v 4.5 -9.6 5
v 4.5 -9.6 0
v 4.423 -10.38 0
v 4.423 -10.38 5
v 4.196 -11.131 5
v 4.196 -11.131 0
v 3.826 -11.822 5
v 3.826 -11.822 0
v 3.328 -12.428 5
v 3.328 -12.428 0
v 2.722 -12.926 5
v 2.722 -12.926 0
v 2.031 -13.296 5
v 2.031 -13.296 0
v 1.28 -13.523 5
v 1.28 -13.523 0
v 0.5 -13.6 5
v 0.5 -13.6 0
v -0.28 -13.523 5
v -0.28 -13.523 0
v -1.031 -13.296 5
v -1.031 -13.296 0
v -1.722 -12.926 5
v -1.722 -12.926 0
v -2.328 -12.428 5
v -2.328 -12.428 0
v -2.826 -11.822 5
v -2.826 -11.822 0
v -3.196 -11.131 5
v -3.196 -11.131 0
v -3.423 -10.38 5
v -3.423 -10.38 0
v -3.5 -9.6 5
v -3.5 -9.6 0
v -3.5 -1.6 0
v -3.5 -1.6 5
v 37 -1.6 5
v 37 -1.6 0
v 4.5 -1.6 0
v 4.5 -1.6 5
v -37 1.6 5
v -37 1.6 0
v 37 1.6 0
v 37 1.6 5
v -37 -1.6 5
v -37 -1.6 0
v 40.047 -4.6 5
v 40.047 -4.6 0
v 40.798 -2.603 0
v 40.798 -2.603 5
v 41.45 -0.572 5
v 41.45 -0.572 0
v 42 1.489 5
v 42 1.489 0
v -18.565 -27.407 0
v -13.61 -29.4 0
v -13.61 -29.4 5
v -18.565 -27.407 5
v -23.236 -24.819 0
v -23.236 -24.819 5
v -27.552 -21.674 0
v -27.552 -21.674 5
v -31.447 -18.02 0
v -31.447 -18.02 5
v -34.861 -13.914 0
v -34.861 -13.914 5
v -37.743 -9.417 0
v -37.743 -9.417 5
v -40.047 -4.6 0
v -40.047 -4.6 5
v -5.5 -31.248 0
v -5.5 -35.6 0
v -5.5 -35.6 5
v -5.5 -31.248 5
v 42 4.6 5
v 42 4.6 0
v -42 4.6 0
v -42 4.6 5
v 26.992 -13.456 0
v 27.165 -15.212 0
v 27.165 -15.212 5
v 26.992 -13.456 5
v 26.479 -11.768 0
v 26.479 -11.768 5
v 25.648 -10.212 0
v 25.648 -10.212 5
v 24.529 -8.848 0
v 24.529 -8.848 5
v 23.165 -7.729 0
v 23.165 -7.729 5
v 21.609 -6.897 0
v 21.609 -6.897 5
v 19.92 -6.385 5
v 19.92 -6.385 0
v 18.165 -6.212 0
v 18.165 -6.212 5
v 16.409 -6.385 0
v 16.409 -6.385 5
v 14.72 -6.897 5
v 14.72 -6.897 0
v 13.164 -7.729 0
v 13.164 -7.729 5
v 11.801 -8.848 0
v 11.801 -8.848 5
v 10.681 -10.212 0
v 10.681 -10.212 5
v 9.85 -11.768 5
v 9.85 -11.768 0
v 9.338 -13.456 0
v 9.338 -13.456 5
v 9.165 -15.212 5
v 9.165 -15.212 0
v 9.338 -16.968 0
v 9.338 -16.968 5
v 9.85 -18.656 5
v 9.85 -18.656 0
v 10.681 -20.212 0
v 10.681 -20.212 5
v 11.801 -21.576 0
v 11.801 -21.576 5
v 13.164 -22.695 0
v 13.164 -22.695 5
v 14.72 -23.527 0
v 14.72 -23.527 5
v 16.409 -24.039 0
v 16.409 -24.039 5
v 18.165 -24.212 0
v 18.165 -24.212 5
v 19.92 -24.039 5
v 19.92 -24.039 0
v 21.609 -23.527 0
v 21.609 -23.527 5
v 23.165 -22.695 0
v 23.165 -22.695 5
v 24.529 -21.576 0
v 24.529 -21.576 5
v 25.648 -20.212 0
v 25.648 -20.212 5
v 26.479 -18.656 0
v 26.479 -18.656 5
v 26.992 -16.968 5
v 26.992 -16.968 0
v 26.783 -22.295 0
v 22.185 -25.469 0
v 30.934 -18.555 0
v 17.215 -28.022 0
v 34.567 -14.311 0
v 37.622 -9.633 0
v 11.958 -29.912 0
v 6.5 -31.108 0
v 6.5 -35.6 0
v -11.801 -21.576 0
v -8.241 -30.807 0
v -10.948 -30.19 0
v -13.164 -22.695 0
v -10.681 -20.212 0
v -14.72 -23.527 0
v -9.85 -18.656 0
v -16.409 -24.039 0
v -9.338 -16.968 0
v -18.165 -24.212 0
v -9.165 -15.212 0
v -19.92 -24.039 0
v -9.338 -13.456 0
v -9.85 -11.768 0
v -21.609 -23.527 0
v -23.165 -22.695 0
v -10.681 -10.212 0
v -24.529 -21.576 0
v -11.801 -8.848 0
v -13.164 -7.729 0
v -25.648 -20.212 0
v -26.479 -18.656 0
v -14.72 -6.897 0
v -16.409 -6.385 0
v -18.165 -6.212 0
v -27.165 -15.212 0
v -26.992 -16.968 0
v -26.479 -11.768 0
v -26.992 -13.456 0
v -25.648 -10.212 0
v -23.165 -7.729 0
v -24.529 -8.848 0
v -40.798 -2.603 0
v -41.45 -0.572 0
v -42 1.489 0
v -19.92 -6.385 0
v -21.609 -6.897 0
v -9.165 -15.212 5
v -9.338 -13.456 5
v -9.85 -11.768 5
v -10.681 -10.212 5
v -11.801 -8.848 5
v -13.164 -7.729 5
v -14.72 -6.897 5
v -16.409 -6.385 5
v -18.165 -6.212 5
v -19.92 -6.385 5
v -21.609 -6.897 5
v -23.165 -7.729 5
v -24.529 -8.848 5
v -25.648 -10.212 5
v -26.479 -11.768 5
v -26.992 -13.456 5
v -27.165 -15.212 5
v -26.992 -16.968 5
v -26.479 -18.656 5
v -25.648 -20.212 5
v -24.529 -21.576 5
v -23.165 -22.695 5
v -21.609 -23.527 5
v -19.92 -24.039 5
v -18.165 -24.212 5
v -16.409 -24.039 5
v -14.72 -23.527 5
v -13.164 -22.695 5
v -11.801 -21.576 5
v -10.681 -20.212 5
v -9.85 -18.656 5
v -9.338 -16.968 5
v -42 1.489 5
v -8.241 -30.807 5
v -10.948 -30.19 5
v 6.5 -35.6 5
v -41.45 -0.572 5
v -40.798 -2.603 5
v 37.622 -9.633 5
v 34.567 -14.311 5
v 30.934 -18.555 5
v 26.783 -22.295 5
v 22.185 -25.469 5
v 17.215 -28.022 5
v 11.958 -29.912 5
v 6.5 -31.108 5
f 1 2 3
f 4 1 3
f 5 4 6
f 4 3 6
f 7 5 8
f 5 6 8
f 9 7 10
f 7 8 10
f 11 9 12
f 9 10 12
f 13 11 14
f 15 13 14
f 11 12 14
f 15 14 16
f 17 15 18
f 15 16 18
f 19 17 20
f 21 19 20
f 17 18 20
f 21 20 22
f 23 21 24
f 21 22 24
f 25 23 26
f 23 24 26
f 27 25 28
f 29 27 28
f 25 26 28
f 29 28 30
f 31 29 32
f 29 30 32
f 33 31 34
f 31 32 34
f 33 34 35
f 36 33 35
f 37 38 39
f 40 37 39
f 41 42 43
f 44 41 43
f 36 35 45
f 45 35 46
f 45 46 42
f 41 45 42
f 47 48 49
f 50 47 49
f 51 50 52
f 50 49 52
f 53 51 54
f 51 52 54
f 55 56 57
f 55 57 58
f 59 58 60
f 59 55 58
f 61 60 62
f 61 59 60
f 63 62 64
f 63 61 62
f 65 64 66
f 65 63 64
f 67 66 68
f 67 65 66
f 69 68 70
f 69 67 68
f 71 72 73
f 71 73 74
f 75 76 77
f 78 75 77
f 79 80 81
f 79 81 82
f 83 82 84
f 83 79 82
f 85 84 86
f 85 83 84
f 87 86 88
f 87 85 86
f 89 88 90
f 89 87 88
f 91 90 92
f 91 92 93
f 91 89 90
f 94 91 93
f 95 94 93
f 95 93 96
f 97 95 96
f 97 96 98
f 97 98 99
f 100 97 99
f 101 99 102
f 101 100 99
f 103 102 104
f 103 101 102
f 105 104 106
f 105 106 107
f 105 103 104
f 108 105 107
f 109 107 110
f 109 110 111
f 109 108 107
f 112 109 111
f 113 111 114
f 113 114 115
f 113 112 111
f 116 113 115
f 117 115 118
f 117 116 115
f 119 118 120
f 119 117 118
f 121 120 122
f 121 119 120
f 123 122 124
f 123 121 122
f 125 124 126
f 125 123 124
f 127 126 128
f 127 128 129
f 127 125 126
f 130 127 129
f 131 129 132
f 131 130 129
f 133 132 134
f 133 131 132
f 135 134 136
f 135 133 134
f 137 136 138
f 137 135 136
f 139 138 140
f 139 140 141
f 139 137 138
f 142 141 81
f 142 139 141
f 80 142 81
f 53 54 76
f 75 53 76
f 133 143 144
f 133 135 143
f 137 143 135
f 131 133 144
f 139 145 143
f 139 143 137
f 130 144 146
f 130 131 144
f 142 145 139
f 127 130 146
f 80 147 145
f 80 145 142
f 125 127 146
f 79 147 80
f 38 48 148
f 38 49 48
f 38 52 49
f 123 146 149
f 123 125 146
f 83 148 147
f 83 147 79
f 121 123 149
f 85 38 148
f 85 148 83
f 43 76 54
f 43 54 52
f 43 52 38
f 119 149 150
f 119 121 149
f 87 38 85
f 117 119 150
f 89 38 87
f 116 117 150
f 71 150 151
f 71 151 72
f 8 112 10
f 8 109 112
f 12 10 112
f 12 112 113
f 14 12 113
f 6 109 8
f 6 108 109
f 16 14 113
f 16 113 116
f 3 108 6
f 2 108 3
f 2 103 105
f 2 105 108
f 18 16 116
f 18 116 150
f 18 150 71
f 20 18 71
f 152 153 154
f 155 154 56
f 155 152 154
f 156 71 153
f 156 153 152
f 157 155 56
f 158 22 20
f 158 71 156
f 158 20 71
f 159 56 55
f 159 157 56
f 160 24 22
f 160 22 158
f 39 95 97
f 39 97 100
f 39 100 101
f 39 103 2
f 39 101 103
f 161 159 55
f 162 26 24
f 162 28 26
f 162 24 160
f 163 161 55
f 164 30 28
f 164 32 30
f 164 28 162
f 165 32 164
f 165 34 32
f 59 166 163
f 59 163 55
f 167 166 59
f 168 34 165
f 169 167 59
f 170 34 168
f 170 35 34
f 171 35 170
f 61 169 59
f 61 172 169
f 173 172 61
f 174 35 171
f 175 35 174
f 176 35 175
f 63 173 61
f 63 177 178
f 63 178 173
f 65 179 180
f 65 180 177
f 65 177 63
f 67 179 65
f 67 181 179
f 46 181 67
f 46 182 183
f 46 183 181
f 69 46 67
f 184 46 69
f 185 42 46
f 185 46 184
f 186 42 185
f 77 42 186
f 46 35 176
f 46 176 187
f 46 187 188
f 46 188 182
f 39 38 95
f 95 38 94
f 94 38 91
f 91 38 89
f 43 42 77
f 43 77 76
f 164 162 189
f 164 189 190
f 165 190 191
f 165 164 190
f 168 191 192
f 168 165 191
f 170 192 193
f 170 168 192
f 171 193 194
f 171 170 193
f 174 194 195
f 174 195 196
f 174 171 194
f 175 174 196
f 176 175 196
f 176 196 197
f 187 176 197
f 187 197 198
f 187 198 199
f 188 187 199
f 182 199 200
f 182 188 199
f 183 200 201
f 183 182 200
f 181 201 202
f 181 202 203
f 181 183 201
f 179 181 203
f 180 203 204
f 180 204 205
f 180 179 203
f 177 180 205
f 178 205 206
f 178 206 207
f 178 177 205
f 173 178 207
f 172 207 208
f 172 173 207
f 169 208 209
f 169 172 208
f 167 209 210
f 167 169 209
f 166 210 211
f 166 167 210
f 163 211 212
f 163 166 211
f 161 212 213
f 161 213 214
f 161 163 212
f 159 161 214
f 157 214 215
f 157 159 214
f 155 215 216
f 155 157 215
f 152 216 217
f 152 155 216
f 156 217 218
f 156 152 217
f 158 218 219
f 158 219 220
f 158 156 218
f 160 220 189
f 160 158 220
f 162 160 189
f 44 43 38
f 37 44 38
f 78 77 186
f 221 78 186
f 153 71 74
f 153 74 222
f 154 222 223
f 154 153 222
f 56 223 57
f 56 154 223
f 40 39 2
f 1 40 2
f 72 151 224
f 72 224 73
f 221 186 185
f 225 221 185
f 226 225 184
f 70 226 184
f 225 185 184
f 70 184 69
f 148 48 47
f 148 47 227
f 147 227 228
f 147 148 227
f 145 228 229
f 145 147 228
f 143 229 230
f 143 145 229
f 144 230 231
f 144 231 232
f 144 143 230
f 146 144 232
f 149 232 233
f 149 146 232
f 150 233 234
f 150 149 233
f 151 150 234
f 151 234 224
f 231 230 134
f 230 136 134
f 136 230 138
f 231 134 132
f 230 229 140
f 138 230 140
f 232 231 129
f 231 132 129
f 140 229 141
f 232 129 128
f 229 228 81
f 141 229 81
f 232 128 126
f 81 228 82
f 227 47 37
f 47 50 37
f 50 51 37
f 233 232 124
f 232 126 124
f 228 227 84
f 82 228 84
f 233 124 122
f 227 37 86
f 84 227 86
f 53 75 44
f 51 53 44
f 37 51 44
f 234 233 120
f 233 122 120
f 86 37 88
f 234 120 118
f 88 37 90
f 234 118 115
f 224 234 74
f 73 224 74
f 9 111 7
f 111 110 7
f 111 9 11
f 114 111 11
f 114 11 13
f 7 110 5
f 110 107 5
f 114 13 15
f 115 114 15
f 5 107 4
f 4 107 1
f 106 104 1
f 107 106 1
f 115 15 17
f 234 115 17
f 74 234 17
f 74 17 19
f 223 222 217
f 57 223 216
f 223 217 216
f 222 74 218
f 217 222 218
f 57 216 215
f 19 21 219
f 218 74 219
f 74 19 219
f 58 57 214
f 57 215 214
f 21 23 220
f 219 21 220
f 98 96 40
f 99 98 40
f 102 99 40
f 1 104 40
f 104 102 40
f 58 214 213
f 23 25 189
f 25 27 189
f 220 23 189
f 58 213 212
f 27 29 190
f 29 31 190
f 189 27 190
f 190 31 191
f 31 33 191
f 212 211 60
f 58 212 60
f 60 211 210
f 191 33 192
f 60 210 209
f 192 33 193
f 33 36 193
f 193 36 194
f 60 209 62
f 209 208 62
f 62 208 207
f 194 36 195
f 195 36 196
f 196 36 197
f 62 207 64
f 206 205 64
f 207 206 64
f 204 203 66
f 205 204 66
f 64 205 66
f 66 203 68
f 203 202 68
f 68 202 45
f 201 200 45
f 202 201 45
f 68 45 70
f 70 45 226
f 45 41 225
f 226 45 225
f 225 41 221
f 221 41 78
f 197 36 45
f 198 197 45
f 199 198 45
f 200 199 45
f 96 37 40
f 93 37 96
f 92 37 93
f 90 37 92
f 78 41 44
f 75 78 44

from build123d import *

# Parameters (mm, degrees)
SALIENTE_EXTRUIR1_DEPTH = 5
CROQUIS3_R              = 9
SALIENTE_EXTRUIR2_DEPTH = 5


with BuildPart() as part:
    # Croquis1 → Saliente-Extruir1 (new body)
    with BuildSketch(Plane.XY):
        with BuildLine():
            Line((42, 4.6), (-42, 4.6))
            Line((-42, 4.6), (-42, 1.488620272))
            ThreePointArc((-42, 1.488620272), (-41.136537684, -1.59186368), (-40.04747183, -4.6))
            Line((-40.04747183, -4.6), (-5.5, -4.6))
            Line((-5.5, -4.6), (-5.5, -9.6))
            ThreePointArc((-5.5, -9.6), (0.5, -15.6), (6.5, -9.6))
            Line((6.5, -9.6), (6.5, -4.6))
            Line((6.5, -4.6), (40.04747183, -4.6))
            ThreePointArc((40.04747183, -4.6), (41.136537684, -1.59186368), (42, 1.488620272))
            Line((42, 1.488620272), (42, 4.6))
        make_face()
        with BuildLine():
            Line((-3.5, -1.6), (-37, -1.6))
            Line((-37, -1.6), (-37, 1.6))
            Line((-37, 1.6), (37, 1.6))
            Line((37, 1.6), (37, -1.6))
            Line((37, -1.6), (4.5, -1.6))
            Line((4.5, -1.6), (4.5, -4.6))
            Line((4.5, -4.6), (4.5, -5.127864045))
            Line((4.5, -5.127864045), (4.5, -8.163859338))
            Line((4.5, -8.163859338), (4.5, -9.6))
            ThreePointArc((4.5, -9.6), (0.5, -13.6), (-3.5, -9.6))
            Line((-3.5, -9.6), (-3.5, -8.163859338))
            Line((-3.5, -8.163859338), (-3.5, -5.127864045))
            Line((-3.5, -5.127864045), (-3.5, -4.6))
            Line((-3.5, -4.6), (-3.5, -1.6))
        make_face(mode=Mode.SUBTRACT)
    extrude(amount=SALIENTE_EXTRUIR1_DEPTH)

    # Croquis3 → Saliente-Extruir2 (add)
    with BuildSketch(Plane.XY):
        with BuildLine():
            Line((6.5, -4.6), (40.04747183, -4.6))
            ThreePointArc((40.04747183, -4.6), (26.783164421, -22.295458451), (6.5, -31.108195935))
            Line((6.5, -31.108195935), (6.5, -35.6))
            Line((6.5, -35.6), (-5.5, -35.6))
            Line((-5.5, -35.6), (-5.5, -31.248453881))
            ThreePointArc((-5.5, -31.248453881), (-9.599739244, -30.51988849), (-13.610290225, -29.4))
            ThreePointArc((-13.610290225, -29.4), (-29.555859947, -19.907001489), (-40.04747183, -4.6))
            Line((-40.04747183, -4.6), (-5.5, -4.6))
            Line((-5.5, -4.6), (-5.5, -9.6))
            ThreePointArc((-5.5, -9.6), (0.5, -15.6), (6.5, -9.6))
            Line((6.5, -9.6), (6.5, -4.6))
        make_face()
        with Locations((-18.164580145, -15.2118728)):
            Circle(CROQUIS3_R, mode=Mode.SUBTRACT)
        with Locations((18.164580145, -15.2118728)):
            Circle(CROQUIS3_R, mode=Mode.SUBTRACT)
    extrude(amount=SALIENTE_EXTRUIR2_DEPTH)


solid = part.part
